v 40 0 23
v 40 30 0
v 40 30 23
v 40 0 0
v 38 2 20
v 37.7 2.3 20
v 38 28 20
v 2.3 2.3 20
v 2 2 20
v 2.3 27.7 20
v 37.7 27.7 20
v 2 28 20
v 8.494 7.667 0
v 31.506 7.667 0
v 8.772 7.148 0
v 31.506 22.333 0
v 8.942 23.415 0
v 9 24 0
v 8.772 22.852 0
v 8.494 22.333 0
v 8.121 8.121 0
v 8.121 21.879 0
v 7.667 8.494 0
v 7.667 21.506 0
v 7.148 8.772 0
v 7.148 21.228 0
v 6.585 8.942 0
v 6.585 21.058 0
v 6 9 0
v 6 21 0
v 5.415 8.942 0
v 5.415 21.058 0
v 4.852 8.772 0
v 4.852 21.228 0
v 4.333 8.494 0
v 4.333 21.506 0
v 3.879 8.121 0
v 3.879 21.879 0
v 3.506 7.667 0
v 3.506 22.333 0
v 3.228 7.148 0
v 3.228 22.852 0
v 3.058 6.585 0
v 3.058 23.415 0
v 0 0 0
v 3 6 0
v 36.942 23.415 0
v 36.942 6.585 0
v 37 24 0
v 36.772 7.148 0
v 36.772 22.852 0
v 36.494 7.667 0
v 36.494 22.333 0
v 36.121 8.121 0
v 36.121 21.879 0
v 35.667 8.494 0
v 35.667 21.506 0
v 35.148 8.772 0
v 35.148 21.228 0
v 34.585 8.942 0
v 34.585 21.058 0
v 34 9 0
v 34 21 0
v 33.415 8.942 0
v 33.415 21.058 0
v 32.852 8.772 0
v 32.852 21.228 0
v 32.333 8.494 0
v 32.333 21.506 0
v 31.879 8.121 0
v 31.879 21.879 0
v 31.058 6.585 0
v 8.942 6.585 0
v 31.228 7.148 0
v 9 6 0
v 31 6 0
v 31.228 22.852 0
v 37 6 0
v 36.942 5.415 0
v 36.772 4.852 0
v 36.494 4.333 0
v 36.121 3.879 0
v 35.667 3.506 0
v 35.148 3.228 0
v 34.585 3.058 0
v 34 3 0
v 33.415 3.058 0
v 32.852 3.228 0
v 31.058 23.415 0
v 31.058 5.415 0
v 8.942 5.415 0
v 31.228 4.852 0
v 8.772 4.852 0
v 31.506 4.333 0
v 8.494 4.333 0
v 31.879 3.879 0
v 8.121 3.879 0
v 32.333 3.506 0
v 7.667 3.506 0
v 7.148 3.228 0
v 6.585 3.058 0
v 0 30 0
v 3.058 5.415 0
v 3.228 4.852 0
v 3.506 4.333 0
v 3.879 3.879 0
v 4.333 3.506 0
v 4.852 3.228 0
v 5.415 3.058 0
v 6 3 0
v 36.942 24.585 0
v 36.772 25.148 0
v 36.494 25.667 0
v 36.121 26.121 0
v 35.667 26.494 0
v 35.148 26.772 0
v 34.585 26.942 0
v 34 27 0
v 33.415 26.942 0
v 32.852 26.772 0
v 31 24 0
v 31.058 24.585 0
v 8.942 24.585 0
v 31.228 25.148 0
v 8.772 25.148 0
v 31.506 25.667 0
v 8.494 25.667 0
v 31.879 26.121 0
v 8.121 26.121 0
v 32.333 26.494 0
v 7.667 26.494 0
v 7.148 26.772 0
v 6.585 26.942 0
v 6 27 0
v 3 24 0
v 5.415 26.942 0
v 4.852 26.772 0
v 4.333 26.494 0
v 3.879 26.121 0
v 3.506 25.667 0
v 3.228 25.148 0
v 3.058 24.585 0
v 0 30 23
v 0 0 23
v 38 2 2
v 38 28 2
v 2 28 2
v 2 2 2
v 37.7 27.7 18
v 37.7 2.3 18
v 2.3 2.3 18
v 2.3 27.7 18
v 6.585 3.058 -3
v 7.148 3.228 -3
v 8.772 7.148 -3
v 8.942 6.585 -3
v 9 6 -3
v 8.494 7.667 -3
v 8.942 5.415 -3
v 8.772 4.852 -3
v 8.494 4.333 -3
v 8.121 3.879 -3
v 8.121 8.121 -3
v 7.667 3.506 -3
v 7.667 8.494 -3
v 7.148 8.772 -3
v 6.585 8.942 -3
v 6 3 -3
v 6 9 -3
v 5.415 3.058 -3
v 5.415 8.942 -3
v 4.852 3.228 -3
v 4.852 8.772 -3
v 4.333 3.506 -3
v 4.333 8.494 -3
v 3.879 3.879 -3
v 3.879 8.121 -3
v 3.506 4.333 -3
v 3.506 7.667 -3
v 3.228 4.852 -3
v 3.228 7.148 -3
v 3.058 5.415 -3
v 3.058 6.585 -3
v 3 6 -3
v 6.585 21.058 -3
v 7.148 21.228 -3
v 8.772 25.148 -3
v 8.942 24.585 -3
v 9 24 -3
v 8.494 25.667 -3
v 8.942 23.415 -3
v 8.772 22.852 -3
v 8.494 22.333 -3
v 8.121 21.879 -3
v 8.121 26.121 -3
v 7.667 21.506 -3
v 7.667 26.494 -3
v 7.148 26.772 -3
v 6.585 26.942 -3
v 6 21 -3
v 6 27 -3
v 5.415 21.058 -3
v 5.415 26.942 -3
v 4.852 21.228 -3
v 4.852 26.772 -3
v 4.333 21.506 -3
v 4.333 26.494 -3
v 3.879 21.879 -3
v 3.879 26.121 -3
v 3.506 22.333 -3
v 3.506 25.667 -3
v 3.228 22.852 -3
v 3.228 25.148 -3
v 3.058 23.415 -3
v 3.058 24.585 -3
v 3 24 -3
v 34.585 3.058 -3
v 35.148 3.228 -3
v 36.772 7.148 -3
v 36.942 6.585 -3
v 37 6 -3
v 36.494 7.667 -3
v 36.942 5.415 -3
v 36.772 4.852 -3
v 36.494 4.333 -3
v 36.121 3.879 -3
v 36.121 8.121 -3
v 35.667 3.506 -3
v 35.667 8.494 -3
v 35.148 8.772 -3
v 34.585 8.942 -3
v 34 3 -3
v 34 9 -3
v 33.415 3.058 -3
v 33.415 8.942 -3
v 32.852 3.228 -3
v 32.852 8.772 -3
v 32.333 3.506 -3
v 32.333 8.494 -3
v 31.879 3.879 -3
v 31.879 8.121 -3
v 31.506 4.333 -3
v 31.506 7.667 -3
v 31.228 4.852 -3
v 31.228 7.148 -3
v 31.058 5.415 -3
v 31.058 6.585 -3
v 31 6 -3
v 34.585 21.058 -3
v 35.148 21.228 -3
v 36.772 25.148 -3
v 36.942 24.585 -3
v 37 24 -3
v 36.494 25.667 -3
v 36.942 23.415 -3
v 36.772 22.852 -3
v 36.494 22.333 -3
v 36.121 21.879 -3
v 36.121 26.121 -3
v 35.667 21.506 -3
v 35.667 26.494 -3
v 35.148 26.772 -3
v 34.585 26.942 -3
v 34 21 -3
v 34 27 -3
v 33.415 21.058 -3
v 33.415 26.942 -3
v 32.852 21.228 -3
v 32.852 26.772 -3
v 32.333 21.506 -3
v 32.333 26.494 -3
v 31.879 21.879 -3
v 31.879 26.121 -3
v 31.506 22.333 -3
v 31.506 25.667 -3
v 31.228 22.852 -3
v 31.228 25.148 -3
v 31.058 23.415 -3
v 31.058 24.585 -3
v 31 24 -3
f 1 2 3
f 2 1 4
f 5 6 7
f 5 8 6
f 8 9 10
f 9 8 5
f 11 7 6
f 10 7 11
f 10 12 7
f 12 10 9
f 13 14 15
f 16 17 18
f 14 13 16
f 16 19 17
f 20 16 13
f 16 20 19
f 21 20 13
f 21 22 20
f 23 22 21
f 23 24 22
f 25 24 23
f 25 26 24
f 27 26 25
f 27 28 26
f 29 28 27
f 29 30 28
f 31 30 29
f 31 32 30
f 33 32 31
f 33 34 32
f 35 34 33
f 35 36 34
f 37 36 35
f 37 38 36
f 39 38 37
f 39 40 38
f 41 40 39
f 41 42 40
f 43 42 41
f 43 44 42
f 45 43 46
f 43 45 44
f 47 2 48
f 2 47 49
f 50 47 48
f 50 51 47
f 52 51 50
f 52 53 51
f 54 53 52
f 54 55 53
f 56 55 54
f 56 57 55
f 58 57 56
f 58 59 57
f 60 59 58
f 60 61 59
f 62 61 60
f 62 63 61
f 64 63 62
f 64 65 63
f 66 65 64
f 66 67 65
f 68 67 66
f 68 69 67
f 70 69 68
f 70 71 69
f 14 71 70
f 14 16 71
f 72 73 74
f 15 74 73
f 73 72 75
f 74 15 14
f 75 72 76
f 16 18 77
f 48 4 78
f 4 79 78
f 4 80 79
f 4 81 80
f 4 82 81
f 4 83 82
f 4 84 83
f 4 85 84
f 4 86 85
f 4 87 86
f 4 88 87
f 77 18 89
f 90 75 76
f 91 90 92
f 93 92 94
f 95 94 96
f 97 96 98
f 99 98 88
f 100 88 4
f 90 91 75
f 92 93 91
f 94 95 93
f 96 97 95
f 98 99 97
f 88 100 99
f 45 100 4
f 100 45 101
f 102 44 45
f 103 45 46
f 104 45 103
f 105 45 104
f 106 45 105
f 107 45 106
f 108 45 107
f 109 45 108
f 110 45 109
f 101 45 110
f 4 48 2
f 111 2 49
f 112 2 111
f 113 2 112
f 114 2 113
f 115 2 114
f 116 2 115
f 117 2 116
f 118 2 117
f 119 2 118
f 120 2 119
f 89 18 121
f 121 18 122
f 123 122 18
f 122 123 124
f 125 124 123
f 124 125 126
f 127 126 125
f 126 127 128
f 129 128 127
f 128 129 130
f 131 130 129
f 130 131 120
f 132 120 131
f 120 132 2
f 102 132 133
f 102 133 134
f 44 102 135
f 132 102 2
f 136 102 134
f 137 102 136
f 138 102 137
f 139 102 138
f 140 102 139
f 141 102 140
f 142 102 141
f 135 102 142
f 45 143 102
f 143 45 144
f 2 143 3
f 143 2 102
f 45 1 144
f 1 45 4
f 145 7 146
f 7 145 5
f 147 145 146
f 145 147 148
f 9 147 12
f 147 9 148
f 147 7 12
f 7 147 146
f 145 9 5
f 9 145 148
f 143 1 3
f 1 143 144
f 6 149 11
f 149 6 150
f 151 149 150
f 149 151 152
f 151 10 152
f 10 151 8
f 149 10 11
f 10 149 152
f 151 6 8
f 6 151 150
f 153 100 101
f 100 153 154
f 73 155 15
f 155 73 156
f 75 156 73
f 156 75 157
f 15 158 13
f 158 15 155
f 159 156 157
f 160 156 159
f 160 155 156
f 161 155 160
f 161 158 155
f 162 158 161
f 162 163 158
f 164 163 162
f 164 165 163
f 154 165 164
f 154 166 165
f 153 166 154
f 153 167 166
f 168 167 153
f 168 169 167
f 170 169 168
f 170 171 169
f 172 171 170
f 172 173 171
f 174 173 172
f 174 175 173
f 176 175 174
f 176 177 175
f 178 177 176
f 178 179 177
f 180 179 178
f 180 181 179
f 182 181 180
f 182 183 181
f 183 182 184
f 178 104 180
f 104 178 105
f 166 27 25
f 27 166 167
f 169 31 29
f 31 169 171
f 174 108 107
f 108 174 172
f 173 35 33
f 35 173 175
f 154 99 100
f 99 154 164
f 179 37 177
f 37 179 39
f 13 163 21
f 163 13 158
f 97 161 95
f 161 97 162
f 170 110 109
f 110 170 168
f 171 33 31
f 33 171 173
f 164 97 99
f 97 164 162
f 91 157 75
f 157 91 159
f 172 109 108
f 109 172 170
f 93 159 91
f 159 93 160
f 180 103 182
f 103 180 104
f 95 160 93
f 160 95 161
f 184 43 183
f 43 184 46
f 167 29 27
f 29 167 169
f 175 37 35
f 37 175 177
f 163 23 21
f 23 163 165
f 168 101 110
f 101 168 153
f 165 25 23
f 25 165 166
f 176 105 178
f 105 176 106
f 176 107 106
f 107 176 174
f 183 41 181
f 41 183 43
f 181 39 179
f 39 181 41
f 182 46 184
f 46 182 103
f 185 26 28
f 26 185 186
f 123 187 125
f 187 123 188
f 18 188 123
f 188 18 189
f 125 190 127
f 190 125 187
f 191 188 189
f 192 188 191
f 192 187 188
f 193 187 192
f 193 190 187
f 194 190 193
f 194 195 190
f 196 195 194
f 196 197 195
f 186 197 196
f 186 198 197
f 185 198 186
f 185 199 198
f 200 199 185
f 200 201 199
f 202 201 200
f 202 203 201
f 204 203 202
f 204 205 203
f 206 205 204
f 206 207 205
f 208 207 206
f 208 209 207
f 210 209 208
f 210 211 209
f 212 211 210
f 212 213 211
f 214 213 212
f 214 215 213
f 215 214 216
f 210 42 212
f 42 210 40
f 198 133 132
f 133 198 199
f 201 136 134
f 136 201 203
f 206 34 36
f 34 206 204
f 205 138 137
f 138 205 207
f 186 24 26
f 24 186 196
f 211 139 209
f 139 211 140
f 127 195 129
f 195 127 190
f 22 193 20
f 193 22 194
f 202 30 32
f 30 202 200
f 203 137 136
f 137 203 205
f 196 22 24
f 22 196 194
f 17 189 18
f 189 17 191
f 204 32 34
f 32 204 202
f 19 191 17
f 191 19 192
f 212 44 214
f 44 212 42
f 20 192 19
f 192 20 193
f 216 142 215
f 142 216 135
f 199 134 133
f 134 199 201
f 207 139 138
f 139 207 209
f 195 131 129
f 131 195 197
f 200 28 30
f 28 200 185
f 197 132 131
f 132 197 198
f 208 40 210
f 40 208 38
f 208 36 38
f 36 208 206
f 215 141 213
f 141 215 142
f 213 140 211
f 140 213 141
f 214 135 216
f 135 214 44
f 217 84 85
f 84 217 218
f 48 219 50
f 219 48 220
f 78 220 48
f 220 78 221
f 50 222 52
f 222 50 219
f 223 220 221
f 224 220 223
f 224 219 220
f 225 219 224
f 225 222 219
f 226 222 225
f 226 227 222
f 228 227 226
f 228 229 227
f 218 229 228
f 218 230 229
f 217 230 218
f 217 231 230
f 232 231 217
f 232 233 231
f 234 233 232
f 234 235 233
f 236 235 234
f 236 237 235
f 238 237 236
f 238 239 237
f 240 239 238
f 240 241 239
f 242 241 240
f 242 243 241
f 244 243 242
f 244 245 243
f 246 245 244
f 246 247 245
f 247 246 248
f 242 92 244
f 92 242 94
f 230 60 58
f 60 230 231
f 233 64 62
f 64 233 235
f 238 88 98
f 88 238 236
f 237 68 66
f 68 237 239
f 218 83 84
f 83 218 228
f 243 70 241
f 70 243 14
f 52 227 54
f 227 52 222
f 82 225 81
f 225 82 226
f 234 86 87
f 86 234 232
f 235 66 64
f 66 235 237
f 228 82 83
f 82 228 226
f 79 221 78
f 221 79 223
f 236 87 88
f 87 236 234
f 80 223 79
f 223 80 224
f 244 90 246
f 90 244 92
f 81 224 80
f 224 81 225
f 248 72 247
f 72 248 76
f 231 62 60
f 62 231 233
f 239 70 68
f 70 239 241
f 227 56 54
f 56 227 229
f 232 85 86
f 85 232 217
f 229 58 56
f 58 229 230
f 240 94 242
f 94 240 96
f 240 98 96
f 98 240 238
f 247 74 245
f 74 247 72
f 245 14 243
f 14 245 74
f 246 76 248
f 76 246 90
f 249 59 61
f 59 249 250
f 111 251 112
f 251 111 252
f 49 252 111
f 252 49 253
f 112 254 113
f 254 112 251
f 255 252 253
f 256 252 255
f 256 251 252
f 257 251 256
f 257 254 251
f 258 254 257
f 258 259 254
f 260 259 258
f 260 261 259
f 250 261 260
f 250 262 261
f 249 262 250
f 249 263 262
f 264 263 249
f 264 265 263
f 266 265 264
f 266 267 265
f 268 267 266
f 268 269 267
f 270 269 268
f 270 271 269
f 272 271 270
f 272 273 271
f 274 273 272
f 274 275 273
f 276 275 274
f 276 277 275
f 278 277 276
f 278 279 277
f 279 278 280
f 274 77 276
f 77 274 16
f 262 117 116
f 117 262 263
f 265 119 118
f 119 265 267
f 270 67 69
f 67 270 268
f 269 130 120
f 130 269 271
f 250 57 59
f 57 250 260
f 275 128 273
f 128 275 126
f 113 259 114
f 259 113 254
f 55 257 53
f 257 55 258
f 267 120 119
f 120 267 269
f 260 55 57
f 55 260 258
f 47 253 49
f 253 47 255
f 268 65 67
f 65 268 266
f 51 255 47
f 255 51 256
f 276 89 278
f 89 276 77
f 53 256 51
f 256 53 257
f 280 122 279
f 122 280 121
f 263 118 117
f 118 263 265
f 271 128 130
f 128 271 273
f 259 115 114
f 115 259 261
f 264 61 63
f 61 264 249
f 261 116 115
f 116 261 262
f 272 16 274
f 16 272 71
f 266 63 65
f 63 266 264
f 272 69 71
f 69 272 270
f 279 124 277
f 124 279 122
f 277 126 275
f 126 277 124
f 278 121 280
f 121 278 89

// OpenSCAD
// A box with a lid and four feet, with a part parameter.
// The part parameter works in plain OpenSCAD too: pick one part to see or
// export only that part. CoCAD builds each value on its own. The part names
// are in part-selector.yml. The lid sits on the box, so in the "all" build
// they touch, but they stay separate parts. The four feet are one value:
// CoCAD names them "Foot 1" to "Foot 4". The coin has the % mark: it shows
// only with "all", and it is not printed.

/* [Parts] */
part = "all"; // [all, box, lid, feet]

/* [Size] */
width = 40; // [20:1:80]
depth = 30; // [20:1:80]
height = 20; // [10:1:60]
wall = 2; // [1.2:0.2:4]
lid_t = 3; // [2:0.5:6]
foot_d = 6; // [3:0.5:12]

$fn = 32;

module box()
    difference() {
        cube([width, depth, height]);
        translate([wall, wall, wall]) cube([width - 2 * wall, depth - 2 * wall, height]);
    }

// In its place in use: on top of the box, with a lip that goes into it.
module lid()
    translate([0, 0, height]) {
        cube([width, depth, lid_t]);
        translate([wall + 0.3, wall + 0.3, -2])
            cube([width - 2 * wall - 0.6, depth - 2 * wall - 0.6, 2]);
    }

// Below the box, one at each corner.
module feet()
    for (x = [foot_d, width - foot_d], y = [foot_d, depth - foot_d])
        translate([x, y, -3]) cylinder(d = foot_d, h = 3);

module coin() translate([width / 2, depth / 2, wall]) cylinder(d = 20, h = 2);

if (part == "all" || part == "box") box();
if (part == "all" || part == "lid") lid();
if (part == "all" || part == "feet") feet();
if (part == "all") %coin();
